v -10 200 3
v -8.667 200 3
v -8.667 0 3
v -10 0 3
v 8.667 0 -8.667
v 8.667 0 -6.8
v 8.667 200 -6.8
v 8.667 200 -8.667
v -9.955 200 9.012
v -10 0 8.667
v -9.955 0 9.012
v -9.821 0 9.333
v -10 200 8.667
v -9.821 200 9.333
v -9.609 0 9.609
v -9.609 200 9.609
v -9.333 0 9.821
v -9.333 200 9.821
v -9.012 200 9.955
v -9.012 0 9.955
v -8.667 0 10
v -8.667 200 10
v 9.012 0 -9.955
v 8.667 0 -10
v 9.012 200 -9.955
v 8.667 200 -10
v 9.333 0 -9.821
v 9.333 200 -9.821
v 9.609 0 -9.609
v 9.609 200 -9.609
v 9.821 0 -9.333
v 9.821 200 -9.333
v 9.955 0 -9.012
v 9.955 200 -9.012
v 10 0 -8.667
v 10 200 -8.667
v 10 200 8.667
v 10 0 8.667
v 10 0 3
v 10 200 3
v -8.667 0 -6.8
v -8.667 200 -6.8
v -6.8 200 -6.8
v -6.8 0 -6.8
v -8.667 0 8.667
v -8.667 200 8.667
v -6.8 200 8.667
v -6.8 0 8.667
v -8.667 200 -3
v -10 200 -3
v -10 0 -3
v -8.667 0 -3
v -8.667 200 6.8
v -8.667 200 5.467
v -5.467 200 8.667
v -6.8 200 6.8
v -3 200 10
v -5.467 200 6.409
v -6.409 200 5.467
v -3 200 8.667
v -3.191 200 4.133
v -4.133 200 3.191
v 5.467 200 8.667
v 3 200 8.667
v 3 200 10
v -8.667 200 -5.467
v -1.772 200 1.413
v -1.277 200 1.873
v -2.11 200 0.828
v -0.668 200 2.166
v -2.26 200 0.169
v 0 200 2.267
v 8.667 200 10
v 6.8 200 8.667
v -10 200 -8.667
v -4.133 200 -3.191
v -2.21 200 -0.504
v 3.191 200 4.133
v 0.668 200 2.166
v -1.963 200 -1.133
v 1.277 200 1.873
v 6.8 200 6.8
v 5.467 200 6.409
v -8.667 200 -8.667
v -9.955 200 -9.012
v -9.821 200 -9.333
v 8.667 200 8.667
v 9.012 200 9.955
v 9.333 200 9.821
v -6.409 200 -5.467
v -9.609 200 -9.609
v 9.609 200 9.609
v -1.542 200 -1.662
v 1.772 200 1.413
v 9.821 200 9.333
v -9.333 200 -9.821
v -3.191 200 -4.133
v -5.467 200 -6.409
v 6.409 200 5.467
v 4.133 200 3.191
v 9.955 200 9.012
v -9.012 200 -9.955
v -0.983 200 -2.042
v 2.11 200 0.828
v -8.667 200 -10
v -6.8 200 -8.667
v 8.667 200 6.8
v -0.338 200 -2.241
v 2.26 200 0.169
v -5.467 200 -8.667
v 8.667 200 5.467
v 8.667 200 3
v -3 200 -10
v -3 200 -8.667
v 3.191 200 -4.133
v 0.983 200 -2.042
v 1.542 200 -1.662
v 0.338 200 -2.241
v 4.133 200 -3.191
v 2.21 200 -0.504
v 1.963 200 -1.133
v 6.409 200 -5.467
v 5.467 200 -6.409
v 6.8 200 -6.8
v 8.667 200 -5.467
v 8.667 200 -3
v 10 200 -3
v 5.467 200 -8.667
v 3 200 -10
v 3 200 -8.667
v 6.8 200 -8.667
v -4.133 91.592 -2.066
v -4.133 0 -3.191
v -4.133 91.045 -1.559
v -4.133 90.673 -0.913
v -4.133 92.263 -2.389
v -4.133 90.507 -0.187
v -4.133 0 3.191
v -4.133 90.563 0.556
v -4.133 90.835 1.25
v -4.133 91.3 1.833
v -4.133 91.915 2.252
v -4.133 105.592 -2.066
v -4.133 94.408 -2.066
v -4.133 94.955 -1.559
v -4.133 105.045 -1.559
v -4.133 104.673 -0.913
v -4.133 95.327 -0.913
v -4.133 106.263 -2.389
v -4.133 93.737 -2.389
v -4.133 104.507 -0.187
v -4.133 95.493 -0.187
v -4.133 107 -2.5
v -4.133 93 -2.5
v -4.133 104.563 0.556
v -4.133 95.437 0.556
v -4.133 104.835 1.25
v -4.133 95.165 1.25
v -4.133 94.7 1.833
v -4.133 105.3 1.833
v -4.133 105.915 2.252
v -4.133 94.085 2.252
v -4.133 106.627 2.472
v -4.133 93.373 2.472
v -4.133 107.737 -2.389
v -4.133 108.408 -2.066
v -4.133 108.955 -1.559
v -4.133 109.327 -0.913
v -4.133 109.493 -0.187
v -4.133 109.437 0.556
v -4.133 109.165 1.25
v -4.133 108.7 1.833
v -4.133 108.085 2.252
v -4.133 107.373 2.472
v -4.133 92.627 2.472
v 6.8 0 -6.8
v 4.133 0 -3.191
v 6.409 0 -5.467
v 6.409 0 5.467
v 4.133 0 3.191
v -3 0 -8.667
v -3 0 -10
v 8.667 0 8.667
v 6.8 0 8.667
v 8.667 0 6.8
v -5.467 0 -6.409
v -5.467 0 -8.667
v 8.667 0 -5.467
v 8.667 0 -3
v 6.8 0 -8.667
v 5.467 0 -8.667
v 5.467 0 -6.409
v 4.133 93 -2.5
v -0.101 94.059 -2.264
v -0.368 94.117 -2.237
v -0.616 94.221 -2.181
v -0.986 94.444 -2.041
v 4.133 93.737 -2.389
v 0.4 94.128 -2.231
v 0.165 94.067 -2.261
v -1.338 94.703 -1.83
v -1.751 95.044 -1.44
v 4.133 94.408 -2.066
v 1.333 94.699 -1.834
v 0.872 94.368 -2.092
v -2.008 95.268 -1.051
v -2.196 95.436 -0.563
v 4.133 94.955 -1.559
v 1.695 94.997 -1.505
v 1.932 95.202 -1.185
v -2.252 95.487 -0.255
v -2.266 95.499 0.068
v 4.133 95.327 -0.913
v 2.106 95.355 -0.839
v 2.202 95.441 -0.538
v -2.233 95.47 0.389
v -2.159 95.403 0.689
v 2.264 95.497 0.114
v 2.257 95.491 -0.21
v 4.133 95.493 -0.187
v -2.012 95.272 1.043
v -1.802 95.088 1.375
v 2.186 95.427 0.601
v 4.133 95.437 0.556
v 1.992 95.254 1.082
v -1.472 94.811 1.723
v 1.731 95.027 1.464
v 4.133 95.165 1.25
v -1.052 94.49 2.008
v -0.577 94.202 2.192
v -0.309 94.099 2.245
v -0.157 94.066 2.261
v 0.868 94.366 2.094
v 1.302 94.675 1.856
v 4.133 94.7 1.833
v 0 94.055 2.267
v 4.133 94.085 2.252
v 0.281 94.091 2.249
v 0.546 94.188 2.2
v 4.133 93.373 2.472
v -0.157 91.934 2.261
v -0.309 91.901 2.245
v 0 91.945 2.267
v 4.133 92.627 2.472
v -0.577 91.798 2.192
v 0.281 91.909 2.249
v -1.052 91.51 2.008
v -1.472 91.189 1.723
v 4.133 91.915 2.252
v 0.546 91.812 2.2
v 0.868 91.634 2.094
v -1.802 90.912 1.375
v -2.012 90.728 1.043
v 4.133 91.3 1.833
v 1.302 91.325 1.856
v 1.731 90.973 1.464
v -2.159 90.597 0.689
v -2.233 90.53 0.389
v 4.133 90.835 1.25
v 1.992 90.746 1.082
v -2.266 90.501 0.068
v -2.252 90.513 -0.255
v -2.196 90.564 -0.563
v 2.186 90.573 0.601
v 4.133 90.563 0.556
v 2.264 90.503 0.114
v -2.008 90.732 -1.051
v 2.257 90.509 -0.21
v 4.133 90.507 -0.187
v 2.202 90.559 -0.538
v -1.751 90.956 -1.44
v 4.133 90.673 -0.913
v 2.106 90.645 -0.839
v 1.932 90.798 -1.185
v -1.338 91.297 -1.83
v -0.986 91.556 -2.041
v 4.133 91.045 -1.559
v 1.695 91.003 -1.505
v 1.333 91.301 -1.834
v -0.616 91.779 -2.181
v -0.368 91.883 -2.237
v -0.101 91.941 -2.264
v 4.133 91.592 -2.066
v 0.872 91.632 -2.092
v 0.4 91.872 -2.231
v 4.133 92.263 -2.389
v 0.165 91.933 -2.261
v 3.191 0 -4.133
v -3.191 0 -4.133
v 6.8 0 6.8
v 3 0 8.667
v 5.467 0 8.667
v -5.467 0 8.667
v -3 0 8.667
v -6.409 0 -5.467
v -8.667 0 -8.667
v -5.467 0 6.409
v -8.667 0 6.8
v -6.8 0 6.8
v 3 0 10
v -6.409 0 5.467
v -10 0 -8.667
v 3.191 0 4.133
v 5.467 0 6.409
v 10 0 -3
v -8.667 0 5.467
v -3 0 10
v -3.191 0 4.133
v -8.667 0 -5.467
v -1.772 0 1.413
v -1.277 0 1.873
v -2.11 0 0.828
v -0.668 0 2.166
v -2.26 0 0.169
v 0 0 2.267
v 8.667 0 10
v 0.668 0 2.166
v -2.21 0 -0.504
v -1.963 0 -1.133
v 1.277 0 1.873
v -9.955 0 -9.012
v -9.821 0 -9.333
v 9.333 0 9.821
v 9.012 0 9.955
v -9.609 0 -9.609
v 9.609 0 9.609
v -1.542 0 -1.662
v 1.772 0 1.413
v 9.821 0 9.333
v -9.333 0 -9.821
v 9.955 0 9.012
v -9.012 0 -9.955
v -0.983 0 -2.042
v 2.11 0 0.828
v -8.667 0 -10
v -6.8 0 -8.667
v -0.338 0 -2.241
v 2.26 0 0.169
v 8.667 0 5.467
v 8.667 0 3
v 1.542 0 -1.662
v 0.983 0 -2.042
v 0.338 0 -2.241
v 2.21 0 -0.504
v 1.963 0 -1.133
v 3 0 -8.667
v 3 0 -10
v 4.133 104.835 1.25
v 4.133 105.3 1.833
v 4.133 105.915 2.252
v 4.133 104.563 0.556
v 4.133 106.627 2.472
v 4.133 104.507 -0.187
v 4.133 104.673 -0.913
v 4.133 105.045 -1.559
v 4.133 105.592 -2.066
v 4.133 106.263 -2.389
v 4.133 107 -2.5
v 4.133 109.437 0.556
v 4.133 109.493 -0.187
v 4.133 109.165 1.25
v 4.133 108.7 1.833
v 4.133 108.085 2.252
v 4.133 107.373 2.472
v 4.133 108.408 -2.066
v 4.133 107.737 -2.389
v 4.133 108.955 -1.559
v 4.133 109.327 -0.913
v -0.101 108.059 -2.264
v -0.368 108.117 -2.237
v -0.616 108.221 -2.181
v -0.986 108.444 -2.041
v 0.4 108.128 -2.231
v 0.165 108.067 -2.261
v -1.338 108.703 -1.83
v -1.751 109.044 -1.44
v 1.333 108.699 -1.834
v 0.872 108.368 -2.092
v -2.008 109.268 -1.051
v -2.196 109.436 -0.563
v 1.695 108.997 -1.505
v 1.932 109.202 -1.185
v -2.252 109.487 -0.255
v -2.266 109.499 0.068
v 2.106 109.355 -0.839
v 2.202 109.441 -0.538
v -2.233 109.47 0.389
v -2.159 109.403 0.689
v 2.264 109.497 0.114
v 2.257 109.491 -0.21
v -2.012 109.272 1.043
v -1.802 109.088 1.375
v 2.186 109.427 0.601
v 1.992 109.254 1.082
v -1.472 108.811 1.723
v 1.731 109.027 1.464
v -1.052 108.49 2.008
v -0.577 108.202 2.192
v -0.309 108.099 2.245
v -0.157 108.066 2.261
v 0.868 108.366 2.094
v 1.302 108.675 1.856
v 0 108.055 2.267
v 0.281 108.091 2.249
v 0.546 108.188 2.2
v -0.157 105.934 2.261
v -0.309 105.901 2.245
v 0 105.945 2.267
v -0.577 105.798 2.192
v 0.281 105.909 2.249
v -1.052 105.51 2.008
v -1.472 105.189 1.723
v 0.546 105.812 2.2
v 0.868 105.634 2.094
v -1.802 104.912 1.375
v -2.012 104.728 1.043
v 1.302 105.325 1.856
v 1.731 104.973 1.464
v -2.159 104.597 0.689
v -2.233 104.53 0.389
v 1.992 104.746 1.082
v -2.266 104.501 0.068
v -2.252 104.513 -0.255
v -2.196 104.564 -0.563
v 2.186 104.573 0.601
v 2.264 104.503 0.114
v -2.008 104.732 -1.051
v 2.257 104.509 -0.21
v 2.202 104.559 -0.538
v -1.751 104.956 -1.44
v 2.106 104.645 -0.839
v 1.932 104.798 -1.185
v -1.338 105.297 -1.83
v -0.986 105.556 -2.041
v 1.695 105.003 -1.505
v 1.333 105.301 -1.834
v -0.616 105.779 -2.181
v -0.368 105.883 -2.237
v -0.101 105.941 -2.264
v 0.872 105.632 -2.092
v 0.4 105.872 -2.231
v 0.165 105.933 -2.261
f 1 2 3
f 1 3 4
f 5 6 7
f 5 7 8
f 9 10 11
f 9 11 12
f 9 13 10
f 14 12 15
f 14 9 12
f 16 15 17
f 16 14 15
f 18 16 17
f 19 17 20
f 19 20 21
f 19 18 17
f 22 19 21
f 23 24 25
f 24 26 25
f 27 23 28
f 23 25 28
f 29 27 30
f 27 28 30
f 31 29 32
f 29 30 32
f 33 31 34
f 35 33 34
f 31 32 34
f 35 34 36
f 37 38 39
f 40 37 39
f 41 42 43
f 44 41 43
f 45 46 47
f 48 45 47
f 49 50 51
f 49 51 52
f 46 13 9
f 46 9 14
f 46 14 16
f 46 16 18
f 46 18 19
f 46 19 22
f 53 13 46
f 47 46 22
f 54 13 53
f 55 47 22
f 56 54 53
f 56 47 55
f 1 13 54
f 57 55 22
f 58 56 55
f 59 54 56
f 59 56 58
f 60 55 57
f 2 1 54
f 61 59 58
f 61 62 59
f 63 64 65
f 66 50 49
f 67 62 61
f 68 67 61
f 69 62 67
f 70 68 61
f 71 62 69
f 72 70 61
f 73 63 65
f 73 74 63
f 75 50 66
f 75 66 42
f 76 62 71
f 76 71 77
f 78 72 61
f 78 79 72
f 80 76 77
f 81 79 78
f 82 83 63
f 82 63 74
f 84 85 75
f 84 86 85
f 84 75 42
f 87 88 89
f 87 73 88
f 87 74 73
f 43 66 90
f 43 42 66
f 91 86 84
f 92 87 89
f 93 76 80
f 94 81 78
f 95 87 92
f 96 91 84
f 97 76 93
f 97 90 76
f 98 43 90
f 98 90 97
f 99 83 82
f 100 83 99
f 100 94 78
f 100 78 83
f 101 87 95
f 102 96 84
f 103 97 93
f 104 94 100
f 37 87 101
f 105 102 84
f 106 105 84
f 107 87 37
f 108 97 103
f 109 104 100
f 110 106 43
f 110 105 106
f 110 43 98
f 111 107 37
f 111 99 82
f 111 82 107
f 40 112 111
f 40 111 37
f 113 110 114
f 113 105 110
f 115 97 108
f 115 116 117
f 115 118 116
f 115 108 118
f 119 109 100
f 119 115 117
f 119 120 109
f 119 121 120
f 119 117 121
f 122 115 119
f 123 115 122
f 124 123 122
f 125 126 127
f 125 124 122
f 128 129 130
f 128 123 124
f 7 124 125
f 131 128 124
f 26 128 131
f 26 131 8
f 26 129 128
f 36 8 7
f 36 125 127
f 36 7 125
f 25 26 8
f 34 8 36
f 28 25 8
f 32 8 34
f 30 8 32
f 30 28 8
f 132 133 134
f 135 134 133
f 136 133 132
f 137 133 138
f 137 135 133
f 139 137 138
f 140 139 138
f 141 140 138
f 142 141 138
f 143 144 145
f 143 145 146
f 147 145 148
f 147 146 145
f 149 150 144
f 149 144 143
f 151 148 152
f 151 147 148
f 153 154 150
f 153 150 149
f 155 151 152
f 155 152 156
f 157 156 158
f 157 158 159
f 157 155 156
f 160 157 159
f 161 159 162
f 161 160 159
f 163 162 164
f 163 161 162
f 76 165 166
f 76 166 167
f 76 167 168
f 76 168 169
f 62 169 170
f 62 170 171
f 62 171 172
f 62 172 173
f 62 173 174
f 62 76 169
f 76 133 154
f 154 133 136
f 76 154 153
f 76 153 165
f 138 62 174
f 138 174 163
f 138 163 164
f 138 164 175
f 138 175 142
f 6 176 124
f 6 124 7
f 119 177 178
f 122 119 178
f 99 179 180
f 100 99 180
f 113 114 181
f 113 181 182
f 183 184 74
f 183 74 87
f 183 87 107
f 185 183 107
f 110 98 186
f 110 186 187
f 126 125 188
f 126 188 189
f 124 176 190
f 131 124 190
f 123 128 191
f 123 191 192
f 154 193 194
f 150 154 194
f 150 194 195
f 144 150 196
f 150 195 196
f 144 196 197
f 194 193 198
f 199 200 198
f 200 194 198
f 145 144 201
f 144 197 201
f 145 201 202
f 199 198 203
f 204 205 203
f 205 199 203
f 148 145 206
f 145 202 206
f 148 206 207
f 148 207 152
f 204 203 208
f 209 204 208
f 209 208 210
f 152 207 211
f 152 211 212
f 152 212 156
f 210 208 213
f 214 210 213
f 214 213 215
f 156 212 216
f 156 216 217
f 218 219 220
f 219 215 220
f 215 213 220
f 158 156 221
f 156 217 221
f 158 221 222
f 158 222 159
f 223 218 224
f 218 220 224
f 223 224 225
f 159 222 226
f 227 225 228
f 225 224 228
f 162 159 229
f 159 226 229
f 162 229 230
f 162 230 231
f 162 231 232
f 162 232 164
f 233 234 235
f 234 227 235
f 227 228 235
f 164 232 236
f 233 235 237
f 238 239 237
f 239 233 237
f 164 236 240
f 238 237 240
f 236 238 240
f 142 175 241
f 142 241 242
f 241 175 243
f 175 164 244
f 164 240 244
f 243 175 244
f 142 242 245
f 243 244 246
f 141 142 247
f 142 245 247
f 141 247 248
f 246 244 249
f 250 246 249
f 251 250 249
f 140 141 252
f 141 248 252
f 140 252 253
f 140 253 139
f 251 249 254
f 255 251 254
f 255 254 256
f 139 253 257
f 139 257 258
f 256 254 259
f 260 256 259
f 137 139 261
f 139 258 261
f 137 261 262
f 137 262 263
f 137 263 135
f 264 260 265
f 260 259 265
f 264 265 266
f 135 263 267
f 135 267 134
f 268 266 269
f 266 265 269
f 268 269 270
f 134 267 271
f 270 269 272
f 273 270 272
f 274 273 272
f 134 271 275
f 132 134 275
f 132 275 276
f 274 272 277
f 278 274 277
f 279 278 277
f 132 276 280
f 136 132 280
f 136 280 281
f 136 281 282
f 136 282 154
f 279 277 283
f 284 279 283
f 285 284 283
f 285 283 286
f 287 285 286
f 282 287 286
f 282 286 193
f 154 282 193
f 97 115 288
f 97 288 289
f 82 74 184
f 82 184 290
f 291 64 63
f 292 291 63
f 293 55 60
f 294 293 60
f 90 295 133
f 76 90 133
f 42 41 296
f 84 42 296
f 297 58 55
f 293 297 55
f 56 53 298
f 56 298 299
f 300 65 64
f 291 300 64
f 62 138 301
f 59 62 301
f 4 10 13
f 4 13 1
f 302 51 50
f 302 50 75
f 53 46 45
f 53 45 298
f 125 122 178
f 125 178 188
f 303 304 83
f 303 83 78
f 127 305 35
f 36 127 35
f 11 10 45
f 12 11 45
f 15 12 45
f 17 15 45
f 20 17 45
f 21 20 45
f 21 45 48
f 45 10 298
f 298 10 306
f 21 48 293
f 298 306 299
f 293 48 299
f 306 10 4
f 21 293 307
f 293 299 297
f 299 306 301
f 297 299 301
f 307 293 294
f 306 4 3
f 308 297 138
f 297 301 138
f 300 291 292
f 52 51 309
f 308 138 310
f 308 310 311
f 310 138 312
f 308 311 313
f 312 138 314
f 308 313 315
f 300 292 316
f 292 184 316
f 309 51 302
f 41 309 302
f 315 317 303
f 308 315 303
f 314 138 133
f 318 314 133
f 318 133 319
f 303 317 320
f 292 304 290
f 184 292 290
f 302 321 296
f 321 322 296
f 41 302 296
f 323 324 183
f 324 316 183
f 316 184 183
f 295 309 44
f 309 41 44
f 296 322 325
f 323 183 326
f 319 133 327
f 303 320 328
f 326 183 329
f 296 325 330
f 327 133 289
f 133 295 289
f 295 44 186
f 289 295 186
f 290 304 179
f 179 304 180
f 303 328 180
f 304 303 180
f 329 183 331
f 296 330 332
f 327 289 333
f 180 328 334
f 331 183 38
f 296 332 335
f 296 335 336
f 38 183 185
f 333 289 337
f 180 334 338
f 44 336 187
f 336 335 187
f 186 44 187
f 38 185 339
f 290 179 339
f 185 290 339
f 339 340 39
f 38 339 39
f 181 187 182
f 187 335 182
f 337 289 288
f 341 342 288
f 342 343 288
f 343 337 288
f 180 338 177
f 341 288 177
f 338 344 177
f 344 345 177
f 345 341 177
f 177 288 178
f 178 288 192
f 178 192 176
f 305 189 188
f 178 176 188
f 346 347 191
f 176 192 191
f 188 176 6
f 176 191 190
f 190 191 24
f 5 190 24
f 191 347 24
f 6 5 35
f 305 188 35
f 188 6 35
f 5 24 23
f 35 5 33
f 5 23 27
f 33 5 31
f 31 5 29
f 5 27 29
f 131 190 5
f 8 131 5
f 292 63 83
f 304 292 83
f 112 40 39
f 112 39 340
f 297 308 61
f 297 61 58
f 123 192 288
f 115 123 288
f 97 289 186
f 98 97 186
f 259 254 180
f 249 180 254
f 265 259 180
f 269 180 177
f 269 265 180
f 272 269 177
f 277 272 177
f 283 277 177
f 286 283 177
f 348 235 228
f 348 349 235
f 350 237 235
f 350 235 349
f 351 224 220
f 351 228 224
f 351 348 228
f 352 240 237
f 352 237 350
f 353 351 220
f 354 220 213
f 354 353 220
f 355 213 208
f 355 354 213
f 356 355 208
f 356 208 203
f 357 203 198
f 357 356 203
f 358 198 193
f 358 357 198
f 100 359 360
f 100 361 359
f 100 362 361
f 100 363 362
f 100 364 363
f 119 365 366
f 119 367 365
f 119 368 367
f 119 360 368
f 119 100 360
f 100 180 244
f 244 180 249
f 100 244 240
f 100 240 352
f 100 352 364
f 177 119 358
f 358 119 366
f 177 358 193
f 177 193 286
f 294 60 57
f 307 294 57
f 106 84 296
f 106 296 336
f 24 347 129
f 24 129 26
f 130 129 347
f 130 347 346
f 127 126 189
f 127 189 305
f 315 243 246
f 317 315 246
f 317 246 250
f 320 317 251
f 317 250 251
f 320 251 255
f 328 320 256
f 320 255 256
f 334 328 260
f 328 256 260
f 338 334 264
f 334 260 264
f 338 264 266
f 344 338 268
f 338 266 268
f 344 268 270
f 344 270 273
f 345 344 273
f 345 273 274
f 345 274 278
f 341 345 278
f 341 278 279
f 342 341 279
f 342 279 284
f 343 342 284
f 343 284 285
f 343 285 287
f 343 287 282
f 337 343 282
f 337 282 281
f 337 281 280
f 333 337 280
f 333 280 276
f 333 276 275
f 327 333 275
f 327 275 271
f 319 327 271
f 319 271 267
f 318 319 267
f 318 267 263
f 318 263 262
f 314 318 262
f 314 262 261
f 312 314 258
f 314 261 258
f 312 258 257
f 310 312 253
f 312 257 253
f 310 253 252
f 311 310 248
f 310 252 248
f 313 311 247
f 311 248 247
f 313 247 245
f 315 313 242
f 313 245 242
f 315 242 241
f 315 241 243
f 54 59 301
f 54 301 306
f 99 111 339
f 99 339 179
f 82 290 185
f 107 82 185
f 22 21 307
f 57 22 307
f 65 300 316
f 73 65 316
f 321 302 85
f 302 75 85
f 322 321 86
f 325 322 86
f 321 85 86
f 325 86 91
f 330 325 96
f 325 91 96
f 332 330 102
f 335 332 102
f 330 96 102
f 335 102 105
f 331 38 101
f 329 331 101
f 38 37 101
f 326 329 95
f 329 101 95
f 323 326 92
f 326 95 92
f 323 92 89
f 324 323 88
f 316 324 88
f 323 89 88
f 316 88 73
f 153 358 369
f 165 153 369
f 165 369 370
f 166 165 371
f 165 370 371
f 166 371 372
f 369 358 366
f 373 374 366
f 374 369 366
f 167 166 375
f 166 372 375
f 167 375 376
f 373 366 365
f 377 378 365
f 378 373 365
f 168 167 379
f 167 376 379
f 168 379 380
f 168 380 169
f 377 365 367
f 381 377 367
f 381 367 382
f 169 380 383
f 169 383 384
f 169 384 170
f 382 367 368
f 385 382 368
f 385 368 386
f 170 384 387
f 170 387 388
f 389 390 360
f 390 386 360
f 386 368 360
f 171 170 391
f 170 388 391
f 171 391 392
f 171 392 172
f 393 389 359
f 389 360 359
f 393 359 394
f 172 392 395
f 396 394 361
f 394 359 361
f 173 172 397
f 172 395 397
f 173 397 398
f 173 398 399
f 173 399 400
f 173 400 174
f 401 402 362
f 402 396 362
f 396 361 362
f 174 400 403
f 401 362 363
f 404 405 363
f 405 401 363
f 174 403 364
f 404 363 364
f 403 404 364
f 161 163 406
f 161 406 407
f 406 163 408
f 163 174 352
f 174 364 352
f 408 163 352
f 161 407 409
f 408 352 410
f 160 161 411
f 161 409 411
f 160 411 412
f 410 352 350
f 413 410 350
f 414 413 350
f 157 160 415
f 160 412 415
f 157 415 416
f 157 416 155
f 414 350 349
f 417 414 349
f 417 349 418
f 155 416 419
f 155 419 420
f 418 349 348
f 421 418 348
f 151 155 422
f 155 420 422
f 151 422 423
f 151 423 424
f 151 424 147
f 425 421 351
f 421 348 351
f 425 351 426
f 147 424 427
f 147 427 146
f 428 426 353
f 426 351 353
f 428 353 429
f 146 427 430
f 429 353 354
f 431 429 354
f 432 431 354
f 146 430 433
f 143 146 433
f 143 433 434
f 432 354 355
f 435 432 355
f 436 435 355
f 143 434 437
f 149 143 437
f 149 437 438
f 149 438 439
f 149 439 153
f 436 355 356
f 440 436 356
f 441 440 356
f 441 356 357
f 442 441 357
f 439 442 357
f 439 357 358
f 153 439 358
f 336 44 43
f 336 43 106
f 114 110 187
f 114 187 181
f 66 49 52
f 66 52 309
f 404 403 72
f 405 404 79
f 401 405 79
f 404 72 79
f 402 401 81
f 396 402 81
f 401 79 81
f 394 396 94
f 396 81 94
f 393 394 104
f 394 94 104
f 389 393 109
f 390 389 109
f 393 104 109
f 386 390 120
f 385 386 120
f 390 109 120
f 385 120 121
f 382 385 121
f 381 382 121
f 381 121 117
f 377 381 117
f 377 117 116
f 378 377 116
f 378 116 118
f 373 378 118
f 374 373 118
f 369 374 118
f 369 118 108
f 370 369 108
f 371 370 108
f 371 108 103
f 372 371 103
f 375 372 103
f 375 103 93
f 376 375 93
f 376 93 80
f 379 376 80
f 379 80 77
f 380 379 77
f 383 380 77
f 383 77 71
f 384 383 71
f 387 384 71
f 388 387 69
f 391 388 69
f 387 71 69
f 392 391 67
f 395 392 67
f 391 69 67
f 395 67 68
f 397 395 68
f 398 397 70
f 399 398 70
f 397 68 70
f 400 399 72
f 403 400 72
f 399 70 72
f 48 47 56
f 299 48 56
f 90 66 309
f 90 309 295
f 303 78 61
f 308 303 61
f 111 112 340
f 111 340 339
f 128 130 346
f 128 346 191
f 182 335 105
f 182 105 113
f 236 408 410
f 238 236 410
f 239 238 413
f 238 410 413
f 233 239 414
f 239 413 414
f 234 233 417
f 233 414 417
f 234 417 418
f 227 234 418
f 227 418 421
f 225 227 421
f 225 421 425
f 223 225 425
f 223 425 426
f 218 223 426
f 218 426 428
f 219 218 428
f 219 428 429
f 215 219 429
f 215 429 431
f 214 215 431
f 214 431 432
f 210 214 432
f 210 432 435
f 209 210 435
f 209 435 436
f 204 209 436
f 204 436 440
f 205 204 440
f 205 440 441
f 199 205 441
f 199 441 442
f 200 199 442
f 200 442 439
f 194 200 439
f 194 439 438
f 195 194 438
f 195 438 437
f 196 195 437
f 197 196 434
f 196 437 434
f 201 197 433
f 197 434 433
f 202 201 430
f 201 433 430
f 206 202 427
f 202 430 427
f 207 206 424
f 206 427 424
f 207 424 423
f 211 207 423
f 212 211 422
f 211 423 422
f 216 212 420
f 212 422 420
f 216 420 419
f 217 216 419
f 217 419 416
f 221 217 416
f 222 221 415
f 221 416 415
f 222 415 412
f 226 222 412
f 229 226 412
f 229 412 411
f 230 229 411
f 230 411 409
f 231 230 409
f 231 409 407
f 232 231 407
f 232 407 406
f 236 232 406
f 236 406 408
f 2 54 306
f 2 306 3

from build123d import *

# Parameters (mm, degrees)
SKETCH1_W           = 20
SKETCH1_H           = 20
EXTRUDE1_DEPTH      = 200
SKETCH2_R           = 2.266666667
SKETCH2_W           = 1.866666667
SKETCH2_H           = 1.866666667
EXTRUDE2_DEPTH      = 201.499376558
FILLET1_R           = 1.333333333
SKETCH_1_R          = 2.5
CUT_EXTRUDE_1_DEPTH = 202.246117975


with BuildPart() as part:
    # Sketch1 → Extrude1 (new body)
    with BuildSketch(Plane(origin=(0, 0, 0), x_dir=(1, 0, 0), z_dir=(0, 1, 0))):
        Rectangle(SKETCH1_W, SKETCH1_H)
    extrude(amount=EXTRUDE1_DEPTH)

    # Sketch2 → Extrude2 (cut, through all)
    with BuildSketch(Plane(origin=(0, 200, 0), x_dir=(1, 0, 0), z_dir=(0, 1, 0))):
        Circle(SKETCH2_R)
        Polygon((8.666666667, 3), (11.333333333, 3), (11.333333333, -3), (8.666666667, -3), (8.666666667, -5.466666667), (6.409475708, -5.466666667), (4.133333333, -3.190524292), (4.133333333, 3.190524292), (6.409475708, 5.466666667), (8.666666667, 5.466666667), align=None)
        with Locations((7.733333334, 7.733333334)):
            Rectangle(SKETCH2_W, SKETCH2_H)
        Polygon((-3.190524292, 4.133333333), (-5.466666667, 6.409475708), (-5.466666667, 8.666666667), (-3, 8.666666667), (-3, 11.333333333), (3, 11.333333333), (3, 8.666666667), (5.466666667, 8.666666667), (5.466666667, 6.409475708), (3.190524292, 4.133333333), align=None)
        with Locations((7.733333334, -7.733333334)):
            Rectangle(SKETCH2_W, SKETCH2_H)
        with Locations((-7.733333334, 7.733333334)):
            Rectangle(SKETCH2_W, SKETCH2_H)
        with Locations((-7.733333334, -7.733333334)):
            Rectangle(SKETCH2_W, SKETCH2_H)
        Polygon((-6.409475708, -5.466666667), (-8.666666667, -5.466666667), (-8.666666667, -3), (-11.333333333, -3), (-11.333333333, 3), (-8.666666667, 3), (-8.666666667, 5.466666667), (-6.409475708, 5.466666667), (-4.133333333, 3.190524292), (-4.133333333, -3.190524292), align=None)
        Polygon((3.190524292, -4.133333333), (-3.190524292, -4.133333333), (-5.466666667, -6.409475708), (-5.466666667, -8.666666667), (-3, -8.666666667), (-3, -11.333333333), (3, -11.333333333), (3, -8.666666667), (5.466666667, -8.666666667), (5.466666667, -6.409475708), align=None)
    extrude(amount=-EXTRUDE2_DEPTH, mode=Mode.SUBTRACT)

    # Fillet1
    fillet1_edges = [part.edges().sort_by_distance(p)[0] for p in [
        (10, 100, 10),
        (10, 100, -10),
        (-10, 100, 10),
        (-10, 100, -10),
    ]]
    fillet(fillet1_edges, radius=FILLET1_R)

    # Эскиз1 → Вырез-Вытянуть1 (cut, through all)
    with BuildSketch(Plane(origin=(10, 0, 0), x_dir=(0, 0, -1), z_dir=(1, 0, 0))):
        with Locations((0, 93)):
            Circle(SKETCH_1_R)
        with Locations((0, 107)):
            Circle(SKETCH_1_R)
    extrude(amount=-CUT_EXTRUDE_1_DEPTH, mode=Mode.SUBTRACT)


solid = part.part
